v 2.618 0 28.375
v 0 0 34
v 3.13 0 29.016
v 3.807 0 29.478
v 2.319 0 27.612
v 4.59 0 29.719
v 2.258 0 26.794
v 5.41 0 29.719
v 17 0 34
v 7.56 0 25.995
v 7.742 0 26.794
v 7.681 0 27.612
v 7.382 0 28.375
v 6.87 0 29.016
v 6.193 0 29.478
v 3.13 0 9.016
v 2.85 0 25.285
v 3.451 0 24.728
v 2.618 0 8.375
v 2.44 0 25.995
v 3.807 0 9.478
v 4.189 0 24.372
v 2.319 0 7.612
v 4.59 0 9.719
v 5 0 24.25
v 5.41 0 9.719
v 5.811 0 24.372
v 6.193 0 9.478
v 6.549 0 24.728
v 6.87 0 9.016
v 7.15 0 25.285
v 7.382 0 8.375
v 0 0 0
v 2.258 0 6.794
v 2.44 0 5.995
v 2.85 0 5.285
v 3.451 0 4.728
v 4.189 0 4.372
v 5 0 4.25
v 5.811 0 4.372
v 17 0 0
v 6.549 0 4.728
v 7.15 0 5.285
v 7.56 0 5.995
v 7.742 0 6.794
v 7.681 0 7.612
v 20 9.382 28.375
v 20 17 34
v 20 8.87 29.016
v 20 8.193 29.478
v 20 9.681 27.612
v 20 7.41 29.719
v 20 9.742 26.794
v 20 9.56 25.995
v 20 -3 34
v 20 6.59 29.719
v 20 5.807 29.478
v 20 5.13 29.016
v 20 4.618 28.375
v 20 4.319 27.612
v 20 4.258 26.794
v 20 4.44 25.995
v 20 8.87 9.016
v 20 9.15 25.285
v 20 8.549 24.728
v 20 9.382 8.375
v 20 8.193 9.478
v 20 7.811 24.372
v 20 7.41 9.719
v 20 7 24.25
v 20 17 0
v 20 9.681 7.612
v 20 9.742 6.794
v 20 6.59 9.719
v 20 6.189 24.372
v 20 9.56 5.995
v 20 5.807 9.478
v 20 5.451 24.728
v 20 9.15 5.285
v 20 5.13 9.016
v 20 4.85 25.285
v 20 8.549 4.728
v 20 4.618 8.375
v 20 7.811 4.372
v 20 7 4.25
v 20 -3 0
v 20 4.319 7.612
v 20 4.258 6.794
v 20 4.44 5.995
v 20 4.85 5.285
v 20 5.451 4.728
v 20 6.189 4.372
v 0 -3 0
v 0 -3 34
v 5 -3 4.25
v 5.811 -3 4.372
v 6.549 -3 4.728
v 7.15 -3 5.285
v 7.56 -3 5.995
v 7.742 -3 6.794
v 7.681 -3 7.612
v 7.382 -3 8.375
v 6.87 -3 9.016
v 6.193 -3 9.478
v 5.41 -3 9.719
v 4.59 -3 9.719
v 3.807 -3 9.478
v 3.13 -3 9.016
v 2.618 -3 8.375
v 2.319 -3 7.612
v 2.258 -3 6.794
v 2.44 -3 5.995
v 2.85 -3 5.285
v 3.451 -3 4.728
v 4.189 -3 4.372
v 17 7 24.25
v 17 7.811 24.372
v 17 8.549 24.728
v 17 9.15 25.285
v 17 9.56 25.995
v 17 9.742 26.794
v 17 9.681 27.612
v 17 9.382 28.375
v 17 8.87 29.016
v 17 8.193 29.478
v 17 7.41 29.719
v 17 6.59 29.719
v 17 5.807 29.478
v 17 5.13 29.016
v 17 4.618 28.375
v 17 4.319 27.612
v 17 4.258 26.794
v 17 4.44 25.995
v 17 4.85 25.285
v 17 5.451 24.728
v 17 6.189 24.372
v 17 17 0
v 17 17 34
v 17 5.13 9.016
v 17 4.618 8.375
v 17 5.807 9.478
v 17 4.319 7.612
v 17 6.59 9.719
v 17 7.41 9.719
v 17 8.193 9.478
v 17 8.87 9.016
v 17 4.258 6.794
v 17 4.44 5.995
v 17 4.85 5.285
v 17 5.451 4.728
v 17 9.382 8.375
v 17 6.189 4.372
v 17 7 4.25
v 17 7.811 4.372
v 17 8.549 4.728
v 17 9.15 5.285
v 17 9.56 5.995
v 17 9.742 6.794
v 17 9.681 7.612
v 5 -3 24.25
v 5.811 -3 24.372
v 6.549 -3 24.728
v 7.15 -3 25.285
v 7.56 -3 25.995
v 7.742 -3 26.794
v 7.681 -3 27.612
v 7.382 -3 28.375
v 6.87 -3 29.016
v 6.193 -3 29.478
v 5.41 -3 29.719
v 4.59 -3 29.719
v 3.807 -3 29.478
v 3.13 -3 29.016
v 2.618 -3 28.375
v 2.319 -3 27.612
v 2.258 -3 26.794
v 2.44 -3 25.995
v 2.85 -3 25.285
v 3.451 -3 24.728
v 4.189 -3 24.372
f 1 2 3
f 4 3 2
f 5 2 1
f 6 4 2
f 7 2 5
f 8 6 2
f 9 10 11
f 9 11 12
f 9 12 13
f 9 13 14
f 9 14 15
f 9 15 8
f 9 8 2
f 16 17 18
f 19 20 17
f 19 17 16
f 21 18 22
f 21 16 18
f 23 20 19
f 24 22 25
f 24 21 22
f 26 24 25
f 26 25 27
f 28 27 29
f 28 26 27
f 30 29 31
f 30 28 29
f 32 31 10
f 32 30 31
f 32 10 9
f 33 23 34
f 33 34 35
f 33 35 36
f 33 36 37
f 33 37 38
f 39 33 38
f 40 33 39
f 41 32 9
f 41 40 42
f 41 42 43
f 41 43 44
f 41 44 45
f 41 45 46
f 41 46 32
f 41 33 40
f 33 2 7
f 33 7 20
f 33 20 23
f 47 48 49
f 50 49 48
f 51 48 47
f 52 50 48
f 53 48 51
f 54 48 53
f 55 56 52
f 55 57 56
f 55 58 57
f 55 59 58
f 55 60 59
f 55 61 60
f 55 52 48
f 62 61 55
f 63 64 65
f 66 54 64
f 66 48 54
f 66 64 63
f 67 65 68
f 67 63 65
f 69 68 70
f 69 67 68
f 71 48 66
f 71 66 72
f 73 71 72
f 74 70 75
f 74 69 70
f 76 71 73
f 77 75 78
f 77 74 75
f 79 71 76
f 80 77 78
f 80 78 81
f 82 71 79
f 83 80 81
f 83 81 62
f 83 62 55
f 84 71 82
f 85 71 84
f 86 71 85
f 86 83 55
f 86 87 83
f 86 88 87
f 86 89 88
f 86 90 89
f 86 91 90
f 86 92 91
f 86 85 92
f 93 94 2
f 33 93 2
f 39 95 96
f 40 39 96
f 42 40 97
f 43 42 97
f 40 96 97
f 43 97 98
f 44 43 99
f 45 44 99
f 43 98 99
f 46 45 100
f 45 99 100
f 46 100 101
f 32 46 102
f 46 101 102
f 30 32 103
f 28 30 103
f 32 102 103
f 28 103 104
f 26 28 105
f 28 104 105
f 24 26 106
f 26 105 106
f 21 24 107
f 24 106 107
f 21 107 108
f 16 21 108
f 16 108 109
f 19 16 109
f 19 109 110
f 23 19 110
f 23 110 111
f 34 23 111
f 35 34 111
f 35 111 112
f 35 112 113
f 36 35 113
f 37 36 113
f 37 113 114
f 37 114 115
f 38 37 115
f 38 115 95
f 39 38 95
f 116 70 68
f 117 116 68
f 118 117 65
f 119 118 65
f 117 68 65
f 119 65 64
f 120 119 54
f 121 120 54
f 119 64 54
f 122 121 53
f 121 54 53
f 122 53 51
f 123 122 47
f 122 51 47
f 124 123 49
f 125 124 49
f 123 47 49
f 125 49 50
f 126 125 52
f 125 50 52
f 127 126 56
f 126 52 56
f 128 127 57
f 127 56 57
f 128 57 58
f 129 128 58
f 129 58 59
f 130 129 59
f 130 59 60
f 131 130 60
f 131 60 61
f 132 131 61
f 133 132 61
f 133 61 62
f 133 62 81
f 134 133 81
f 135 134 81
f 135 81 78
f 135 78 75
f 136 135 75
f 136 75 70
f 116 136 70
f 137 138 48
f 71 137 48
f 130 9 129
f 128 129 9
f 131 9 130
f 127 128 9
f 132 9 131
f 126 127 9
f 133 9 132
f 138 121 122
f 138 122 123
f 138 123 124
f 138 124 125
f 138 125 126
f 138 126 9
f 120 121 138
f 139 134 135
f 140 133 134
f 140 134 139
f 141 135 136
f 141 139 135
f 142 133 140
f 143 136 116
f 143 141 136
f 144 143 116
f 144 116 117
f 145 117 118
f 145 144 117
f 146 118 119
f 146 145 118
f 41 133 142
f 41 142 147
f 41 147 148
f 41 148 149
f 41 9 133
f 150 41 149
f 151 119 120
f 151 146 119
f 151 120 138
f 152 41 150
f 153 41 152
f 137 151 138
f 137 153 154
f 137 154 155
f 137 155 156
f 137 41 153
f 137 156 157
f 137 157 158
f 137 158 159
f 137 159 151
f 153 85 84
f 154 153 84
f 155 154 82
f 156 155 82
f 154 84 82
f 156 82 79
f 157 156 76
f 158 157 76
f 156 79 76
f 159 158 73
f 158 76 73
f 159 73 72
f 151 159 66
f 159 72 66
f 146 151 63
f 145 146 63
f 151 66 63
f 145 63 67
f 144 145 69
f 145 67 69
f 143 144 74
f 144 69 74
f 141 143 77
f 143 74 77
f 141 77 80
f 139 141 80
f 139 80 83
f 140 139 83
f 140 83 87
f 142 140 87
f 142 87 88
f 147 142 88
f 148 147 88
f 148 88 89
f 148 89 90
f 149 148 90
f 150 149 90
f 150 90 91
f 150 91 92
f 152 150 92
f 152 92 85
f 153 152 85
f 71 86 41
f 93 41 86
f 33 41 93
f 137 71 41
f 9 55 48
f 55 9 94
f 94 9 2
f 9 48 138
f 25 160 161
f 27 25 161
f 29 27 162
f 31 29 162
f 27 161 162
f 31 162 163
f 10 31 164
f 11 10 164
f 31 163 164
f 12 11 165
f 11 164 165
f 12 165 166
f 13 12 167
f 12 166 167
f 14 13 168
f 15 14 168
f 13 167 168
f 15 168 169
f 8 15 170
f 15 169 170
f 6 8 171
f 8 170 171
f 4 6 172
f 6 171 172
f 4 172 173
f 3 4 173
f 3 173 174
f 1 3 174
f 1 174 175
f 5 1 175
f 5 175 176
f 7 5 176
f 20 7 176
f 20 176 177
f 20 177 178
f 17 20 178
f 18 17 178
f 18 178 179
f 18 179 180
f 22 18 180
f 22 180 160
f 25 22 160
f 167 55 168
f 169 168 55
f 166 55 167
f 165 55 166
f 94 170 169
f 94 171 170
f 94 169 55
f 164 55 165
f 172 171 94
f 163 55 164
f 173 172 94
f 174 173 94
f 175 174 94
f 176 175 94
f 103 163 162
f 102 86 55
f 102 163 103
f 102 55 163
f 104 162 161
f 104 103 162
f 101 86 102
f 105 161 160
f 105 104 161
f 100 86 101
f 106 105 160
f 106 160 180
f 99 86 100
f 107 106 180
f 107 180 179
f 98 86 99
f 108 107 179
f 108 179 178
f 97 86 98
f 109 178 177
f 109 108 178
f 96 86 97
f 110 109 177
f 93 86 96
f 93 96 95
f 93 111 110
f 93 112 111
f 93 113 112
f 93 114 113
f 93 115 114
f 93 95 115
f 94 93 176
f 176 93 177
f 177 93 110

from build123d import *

# Parameters (mm, degrees)
EXTRUDE_1_DEPTH     = 34
SKETCH_2_R          = 2.75
CUT_EXTRUDE_1_DEPTH = 43.95346319
SKETCH_3_R          = 2.75
CUT_EXTRUDE_2_DEPTH = 45.226688775


with BuildPart() as part:
    # ｽｹｯﾁ1 → ﾎﾞｽ - 押し出し1 (new body)
    with BuildSketch(Plane.XY):
        Polygon((0, 0), (17, 0), (17, 17), (20, 17), (20, -3), (0, -3), align=None)
    extrude(amount=EXTRUDE_1_DEPTH)

    # ｽｹｯﾁ2 → ｶｯﾄ - 押し出し1 (cut, through all)
    with BuildSketch(Plane(origin=(20, 0, 0), x_dir=(0, 0, -1), z_dir=(1, 0, 0))):
        with Locations((-27, 7)):
            Circle(SKETCH_2_R)
        with Locations((-7, 7)):
            Circle(SKETCH_2_R)
    extrude(amount=-CUT_EXTRUDE_1_DEPTH, mode=Mode.SUBTRACT)

    # ｽｹｯﾁ3 → ｶｯﾄ - 押し出し2 (cut, through all)
    with BuildSketch(Plane.XZ.offset(3)):
        with Locations(Location((5, 7, 0), (0, 0, 270))):
            Circle(SKETCH_3_R)
        with Locations(Location((5, 27, 0), (0, 0, 270))):
            Circle(SKETCH_3_R)
    extrude(amount=-CUT_EXTRUDE_2_DEPTH, mode=Mode.SUBTRACT)


solid = part.part
